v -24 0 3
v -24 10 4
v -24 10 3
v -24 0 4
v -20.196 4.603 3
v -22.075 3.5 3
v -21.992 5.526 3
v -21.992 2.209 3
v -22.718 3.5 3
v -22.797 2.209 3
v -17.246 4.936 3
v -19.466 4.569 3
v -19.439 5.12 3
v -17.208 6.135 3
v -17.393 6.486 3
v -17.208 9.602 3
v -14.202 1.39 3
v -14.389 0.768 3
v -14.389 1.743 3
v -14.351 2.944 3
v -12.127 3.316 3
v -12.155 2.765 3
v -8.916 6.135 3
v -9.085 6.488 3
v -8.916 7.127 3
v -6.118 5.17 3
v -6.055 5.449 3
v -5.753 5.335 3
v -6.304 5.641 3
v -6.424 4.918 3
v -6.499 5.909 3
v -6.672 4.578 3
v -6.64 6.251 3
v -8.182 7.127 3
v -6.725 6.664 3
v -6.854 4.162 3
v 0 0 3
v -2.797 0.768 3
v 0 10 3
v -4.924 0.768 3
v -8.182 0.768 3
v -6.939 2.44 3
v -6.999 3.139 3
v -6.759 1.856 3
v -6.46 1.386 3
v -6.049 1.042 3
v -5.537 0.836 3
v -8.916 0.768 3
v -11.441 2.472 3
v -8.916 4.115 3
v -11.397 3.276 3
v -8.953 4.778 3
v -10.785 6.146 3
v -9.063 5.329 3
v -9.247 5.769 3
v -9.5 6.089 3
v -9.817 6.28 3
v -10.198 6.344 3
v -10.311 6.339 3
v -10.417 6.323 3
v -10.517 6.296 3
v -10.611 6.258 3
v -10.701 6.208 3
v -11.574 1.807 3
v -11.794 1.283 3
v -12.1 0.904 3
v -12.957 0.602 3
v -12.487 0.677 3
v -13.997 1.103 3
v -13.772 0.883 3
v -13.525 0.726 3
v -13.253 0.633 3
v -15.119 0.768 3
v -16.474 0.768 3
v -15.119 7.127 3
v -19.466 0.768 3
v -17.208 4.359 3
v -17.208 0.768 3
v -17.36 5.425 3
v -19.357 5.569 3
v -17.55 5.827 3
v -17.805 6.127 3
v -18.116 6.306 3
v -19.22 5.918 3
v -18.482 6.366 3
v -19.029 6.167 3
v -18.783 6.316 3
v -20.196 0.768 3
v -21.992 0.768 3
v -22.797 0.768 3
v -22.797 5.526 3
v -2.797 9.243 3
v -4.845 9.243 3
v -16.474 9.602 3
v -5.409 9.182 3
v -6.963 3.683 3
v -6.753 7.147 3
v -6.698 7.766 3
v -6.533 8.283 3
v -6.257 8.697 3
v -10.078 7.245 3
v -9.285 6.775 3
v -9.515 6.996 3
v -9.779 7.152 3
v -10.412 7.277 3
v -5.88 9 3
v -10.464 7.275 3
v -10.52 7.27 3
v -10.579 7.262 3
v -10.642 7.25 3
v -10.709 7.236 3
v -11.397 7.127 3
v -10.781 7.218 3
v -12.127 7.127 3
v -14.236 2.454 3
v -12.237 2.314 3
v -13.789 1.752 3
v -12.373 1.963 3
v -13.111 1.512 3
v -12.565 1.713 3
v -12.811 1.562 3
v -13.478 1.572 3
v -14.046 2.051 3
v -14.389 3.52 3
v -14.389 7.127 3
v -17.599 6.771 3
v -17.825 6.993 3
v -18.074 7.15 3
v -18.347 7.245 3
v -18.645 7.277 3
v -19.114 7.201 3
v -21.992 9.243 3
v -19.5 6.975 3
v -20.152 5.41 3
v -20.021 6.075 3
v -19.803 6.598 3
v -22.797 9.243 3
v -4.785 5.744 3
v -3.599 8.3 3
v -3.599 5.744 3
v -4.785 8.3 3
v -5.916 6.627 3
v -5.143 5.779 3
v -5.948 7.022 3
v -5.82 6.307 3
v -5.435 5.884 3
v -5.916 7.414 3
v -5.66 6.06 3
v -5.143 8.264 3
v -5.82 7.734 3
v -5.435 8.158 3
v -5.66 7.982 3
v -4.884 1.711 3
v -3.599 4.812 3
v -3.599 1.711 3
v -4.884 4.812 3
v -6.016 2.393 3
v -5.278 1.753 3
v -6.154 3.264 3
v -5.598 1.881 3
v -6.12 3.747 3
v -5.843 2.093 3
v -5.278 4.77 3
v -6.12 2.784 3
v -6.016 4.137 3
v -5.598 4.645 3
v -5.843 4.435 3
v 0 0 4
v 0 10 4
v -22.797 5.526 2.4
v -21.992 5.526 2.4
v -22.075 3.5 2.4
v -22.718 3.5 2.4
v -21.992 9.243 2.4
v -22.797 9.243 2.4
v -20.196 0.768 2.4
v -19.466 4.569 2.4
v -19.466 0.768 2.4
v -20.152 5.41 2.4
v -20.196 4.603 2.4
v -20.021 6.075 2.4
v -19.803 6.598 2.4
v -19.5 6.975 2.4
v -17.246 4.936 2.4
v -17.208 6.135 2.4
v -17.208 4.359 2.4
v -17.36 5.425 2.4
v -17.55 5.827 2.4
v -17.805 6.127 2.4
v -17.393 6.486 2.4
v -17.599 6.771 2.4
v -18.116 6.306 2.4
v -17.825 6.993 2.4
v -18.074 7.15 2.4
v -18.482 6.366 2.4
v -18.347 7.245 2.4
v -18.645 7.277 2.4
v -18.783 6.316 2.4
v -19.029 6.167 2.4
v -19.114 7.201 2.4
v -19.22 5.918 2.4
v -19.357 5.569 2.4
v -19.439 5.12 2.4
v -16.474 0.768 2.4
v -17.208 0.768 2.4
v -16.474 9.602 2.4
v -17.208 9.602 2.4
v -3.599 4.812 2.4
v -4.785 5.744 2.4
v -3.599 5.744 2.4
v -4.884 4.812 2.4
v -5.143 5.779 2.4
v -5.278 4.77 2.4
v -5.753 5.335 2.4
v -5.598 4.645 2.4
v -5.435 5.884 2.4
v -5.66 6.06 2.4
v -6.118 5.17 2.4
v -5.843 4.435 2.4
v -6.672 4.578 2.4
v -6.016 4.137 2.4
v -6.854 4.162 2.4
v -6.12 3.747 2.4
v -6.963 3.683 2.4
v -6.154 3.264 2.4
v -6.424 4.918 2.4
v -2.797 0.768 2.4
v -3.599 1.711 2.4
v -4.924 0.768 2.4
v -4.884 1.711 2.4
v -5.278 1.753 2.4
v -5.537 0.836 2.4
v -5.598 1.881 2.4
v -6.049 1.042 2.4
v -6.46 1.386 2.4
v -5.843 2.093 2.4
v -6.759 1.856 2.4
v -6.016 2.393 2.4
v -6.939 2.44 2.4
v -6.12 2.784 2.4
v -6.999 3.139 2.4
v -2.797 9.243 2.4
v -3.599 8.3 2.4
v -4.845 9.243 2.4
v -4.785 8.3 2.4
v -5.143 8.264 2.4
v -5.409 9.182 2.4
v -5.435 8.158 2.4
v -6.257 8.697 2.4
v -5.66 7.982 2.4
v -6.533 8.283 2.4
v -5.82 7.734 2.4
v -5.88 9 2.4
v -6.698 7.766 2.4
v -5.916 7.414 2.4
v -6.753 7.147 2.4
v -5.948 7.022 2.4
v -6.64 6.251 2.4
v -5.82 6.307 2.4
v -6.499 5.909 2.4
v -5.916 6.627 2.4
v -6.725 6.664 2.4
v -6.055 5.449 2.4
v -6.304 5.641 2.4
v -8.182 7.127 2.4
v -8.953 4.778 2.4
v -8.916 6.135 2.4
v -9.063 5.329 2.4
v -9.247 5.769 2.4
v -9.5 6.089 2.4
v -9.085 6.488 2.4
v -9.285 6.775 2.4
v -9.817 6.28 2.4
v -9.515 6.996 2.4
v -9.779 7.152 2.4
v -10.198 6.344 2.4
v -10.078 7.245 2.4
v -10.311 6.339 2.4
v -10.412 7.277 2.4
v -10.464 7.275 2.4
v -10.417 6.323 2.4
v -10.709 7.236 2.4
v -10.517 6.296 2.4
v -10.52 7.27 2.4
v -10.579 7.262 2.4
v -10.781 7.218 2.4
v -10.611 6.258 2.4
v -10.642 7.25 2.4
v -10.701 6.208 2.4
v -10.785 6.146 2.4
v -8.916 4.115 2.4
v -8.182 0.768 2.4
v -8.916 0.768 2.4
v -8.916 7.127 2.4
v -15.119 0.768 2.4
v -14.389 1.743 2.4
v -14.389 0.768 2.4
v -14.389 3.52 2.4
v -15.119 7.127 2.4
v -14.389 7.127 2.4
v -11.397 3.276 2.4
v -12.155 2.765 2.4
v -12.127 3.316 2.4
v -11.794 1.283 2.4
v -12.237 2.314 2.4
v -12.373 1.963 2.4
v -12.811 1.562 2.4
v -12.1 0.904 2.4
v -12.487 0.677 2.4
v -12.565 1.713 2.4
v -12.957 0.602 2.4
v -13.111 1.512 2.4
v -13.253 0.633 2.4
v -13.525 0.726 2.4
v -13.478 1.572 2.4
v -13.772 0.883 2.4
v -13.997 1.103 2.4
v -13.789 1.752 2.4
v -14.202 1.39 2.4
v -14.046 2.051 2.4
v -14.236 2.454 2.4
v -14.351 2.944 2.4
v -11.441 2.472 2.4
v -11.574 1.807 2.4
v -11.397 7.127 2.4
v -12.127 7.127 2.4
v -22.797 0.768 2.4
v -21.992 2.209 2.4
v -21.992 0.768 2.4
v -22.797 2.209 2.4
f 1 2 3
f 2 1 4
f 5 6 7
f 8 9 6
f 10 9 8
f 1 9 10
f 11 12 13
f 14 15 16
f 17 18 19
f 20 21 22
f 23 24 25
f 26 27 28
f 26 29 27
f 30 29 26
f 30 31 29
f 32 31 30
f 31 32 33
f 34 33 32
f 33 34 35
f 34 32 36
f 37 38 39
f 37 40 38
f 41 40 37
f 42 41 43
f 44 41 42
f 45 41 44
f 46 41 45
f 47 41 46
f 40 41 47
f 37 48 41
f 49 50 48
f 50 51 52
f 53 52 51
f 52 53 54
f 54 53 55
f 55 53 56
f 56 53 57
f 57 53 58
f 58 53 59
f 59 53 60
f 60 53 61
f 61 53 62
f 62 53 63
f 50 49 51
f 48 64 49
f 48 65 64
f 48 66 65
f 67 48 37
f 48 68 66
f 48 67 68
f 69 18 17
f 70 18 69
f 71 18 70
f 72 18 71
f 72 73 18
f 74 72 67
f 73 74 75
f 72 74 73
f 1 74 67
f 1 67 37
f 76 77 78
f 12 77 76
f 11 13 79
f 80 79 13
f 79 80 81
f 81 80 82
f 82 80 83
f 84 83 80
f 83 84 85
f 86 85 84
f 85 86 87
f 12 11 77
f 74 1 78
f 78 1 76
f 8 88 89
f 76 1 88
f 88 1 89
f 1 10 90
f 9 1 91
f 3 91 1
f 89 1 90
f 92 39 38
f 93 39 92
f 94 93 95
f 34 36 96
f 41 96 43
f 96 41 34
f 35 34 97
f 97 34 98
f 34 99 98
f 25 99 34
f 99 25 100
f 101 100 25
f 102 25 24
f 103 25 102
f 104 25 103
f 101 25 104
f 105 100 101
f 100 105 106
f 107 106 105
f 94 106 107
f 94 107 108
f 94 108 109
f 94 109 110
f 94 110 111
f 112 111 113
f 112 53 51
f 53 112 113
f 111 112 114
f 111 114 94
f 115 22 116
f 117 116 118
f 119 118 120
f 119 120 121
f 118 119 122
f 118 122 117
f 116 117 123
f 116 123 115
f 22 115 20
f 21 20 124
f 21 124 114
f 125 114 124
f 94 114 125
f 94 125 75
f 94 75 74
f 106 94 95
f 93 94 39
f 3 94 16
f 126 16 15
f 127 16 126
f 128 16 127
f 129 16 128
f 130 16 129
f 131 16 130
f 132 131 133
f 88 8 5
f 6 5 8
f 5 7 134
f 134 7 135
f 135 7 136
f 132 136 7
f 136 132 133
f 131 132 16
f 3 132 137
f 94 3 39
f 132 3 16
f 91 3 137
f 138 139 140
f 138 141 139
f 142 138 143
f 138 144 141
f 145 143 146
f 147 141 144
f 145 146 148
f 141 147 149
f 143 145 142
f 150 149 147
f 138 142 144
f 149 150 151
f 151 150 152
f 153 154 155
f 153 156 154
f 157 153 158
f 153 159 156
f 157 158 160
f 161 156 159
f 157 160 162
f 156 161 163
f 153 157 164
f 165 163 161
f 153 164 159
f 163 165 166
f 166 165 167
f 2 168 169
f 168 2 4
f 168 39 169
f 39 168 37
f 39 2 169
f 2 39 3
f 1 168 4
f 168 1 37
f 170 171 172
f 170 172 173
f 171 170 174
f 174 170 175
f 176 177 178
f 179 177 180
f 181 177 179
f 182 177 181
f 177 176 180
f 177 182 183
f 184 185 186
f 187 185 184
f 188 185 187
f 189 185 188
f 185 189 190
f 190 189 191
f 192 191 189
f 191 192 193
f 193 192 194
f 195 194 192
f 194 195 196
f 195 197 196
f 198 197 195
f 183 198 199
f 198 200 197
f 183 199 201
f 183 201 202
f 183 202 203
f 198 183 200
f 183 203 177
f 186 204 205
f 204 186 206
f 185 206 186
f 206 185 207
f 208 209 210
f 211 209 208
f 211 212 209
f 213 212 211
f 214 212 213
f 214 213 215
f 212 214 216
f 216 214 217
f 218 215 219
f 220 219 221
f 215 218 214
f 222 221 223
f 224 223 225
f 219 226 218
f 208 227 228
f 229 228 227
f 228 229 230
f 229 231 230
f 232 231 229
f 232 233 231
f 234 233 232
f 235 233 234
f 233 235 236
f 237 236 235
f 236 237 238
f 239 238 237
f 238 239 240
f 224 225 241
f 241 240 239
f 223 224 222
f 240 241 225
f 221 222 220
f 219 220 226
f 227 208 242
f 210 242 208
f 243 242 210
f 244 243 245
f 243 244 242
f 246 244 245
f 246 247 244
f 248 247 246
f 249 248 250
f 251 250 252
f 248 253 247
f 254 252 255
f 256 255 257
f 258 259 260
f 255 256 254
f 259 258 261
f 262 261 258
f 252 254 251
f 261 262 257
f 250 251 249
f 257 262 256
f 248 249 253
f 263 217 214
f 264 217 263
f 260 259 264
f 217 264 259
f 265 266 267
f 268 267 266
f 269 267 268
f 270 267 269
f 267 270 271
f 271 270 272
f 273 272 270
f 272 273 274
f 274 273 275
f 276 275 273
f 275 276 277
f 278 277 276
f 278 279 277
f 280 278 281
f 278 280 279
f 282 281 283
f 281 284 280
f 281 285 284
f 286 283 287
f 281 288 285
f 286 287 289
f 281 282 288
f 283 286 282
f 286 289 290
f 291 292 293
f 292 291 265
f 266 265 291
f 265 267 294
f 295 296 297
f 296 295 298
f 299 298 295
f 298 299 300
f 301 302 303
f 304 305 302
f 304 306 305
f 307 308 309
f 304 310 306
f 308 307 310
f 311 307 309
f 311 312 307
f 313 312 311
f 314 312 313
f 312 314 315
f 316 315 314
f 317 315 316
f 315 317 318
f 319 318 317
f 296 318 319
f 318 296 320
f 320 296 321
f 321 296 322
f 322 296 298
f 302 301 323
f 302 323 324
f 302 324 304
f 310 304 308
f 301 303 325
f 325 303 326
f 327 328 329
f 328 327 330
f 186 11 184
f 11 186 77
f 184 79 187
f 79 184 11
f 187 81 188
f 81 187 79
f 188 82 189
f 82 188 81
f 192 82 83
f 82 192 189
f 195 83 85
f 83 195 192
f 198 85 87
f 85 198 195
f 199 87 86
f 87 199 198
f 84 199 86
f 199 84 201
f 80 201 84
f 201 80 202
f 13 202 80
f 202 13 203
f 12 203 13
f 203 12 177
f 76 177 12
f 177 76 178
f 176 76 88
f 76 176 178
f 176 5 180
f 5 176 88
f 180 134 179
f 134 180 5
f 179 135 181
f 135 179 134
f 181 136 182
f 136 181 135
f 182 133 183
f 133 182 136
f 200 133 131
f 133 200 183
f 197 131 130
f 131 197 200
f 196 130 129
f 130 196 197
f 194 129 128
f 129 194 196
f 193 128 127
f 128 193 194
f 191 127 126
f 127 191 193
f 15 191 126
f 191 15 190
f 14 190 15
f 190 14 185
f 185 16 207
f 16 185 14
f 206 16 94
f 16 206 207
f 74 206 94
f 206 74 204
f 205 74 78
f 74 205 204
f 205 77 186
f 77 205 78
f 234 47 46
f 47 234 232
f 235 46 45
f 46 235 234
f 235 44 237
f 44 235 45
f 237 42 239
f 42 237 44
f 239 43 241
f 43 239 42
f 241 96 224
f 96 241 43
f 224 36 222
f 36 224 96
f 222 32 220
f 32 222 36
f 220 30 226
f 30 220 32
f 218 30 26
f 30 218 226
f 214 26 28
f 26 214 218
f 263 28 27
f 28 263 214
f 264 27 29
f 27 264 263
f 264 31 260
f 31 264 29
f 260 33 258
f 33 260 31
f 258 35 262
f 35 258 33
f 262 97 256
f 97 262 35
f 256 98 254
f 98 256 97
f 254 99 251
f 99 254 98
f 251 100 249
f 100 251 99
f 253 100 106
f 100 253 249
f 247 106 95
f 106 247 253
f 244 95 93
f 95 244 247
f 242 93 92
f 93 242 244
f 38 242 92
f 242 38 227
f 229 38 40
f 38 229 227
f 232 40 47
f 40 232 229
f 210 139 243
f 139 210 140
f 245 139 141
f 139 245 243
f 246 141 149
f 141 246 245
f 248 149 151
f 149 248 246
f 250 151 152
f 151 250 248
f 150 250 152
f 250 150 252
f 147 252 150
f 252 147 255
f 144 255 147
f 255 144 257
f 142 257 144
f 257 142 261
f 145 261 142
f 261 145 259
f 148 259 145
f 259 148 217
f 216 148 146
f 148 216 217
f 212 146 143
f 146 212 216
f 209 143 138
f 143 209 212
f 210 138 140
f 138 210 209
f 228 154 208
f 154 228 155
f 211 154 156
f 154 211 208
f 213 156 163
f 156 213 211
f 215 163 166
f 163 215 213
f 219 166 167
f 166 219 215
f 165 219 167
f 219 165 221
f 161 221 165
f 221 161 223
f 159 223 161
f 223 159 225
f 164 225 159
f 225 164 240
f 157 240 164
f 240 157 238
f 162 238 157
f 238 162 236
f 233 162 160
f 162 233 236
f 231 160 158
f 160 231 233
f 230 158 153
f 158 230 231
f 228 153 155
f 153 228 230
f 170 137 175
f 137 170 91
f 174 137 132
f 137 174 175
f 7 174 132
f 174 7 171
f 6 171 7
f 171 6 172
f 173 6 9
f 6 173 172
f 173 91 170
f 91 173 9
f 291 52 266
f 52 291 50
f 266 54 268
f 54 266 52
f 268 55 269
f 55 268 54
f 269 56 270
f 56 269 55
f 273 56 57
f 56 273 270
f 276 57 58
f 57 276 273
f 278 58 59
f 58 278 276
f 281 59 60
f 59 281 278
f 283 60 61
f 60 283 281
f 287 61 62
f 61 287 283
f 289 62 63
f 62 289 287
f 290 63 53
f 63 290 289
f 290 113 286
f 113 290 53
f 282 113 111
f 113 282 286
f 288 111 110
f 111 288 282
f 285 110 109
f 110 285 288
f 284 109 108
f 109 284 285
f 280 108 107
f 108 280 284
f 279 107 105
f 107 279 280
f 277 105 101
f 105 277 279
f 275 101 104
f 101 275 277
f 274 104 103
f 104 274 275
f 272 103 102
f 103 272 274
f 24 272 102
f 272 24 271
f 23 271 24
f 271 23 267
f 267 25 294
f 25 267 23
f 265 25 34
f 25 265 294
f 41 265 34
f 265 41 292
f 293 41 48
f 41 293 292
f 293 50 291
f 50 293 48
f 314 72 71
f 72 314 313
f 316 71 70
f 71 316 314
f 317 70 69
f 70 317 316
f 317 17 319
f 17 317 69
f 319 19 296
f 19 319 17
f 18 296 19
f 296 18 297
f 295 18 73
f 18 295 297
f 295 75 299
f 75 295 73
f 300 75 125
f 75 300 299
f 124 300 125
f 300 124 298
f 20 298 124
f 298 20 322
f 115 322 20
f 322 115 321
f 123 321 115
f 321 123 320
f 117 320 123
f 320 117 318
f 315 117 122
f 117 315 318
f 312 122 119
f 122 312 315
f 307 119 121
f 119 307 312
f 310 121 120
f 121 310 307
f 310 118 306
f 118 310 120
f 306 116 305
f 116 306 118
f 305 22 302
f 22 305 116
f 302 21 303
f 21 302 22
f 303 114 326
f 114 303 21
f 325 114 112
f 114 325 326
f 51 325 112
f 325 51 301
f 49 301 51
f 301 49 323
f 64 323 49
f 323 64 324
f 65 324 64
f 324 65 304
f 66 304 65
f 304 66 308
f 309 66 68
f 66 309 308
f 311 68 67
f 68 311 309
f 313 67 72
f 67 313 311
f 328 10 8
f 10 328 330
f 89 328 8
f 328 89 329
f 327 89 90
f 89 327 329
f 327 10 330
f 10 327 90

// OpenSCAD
// file: ../../../../../../basics/text/text-extrude/text-extrude.scad
/**
 * 
 * @param 
 * @param valign valid values are "top", "center", "baseline" and "bottom". Default is "baseline".
 * @return 
 */
module textExtrude(text, textSize=6, valign = "center", font, height=4)
{
    linear_extrude(height=height)
    text(text, 
         font = font, 
         size=textSize, 
         valign = valign,
         halign = "center");
}
// file: ../../../../../../basics/text/tex-around-the-corner/around-the-corner-text.scad
// The implementation of this script was inspired by the answer provived by Torsten Paul
// in this Stack Overflow question
//          http://stackoverflow.com/questions/39564136/how-to-determine-width-of-text-in-openscad/39564288#39564288

use <../text-extrude/text-extrude.scad>

module textWall(text = "this is a text", 
                length = 20, width = 10, 
                leftRightMargin=2, 
                fontSize = 6,
                fontName = "Bauhaus 93:style=Regular")
{
    font = fontName;
    
    union()
    {
        textXOffset = leftRightMargin;
        cubeLength = length + (textXOffset * 2);
        cubeWidth = width;
        color("blue")
        cube([cubeLength, cubeWidth, 1]);

        color("white")
        translate([textXOffset, width / 2.0, 0.6])
        linear_extrude(1, convexity = 4)
        resize([length, cubeWidth * 0.9, 0], auto = true)
        text(text=text, valign = "center", font = font, size=fontSize);
    }
}
// file: ../../text-croc-charm.scad
// use <../../../../basics/text/text-extrude/text-extrude.scad>

use <../../../../basics/text/tex-around-the-corner/around-the-corner-text.scad>

module textCrocCharm(font = "",
                     height=4,
                     text = "default text")
{
    echo("text charm");

    union()
    {


        rotate([0,180,0])
        translate([0,0,-height])
        textWall(
        // textExtrude(
                    fontName = font,
                    height = height,
                    text = text);
    }
}
// main file
use <../../text-croc-charm.scad>

font = "Bauhaus 93:style=Regular";
height = 4;
text = "Bruh!";

textCrocCharm(font = font,
              height = height,
              text = text);
